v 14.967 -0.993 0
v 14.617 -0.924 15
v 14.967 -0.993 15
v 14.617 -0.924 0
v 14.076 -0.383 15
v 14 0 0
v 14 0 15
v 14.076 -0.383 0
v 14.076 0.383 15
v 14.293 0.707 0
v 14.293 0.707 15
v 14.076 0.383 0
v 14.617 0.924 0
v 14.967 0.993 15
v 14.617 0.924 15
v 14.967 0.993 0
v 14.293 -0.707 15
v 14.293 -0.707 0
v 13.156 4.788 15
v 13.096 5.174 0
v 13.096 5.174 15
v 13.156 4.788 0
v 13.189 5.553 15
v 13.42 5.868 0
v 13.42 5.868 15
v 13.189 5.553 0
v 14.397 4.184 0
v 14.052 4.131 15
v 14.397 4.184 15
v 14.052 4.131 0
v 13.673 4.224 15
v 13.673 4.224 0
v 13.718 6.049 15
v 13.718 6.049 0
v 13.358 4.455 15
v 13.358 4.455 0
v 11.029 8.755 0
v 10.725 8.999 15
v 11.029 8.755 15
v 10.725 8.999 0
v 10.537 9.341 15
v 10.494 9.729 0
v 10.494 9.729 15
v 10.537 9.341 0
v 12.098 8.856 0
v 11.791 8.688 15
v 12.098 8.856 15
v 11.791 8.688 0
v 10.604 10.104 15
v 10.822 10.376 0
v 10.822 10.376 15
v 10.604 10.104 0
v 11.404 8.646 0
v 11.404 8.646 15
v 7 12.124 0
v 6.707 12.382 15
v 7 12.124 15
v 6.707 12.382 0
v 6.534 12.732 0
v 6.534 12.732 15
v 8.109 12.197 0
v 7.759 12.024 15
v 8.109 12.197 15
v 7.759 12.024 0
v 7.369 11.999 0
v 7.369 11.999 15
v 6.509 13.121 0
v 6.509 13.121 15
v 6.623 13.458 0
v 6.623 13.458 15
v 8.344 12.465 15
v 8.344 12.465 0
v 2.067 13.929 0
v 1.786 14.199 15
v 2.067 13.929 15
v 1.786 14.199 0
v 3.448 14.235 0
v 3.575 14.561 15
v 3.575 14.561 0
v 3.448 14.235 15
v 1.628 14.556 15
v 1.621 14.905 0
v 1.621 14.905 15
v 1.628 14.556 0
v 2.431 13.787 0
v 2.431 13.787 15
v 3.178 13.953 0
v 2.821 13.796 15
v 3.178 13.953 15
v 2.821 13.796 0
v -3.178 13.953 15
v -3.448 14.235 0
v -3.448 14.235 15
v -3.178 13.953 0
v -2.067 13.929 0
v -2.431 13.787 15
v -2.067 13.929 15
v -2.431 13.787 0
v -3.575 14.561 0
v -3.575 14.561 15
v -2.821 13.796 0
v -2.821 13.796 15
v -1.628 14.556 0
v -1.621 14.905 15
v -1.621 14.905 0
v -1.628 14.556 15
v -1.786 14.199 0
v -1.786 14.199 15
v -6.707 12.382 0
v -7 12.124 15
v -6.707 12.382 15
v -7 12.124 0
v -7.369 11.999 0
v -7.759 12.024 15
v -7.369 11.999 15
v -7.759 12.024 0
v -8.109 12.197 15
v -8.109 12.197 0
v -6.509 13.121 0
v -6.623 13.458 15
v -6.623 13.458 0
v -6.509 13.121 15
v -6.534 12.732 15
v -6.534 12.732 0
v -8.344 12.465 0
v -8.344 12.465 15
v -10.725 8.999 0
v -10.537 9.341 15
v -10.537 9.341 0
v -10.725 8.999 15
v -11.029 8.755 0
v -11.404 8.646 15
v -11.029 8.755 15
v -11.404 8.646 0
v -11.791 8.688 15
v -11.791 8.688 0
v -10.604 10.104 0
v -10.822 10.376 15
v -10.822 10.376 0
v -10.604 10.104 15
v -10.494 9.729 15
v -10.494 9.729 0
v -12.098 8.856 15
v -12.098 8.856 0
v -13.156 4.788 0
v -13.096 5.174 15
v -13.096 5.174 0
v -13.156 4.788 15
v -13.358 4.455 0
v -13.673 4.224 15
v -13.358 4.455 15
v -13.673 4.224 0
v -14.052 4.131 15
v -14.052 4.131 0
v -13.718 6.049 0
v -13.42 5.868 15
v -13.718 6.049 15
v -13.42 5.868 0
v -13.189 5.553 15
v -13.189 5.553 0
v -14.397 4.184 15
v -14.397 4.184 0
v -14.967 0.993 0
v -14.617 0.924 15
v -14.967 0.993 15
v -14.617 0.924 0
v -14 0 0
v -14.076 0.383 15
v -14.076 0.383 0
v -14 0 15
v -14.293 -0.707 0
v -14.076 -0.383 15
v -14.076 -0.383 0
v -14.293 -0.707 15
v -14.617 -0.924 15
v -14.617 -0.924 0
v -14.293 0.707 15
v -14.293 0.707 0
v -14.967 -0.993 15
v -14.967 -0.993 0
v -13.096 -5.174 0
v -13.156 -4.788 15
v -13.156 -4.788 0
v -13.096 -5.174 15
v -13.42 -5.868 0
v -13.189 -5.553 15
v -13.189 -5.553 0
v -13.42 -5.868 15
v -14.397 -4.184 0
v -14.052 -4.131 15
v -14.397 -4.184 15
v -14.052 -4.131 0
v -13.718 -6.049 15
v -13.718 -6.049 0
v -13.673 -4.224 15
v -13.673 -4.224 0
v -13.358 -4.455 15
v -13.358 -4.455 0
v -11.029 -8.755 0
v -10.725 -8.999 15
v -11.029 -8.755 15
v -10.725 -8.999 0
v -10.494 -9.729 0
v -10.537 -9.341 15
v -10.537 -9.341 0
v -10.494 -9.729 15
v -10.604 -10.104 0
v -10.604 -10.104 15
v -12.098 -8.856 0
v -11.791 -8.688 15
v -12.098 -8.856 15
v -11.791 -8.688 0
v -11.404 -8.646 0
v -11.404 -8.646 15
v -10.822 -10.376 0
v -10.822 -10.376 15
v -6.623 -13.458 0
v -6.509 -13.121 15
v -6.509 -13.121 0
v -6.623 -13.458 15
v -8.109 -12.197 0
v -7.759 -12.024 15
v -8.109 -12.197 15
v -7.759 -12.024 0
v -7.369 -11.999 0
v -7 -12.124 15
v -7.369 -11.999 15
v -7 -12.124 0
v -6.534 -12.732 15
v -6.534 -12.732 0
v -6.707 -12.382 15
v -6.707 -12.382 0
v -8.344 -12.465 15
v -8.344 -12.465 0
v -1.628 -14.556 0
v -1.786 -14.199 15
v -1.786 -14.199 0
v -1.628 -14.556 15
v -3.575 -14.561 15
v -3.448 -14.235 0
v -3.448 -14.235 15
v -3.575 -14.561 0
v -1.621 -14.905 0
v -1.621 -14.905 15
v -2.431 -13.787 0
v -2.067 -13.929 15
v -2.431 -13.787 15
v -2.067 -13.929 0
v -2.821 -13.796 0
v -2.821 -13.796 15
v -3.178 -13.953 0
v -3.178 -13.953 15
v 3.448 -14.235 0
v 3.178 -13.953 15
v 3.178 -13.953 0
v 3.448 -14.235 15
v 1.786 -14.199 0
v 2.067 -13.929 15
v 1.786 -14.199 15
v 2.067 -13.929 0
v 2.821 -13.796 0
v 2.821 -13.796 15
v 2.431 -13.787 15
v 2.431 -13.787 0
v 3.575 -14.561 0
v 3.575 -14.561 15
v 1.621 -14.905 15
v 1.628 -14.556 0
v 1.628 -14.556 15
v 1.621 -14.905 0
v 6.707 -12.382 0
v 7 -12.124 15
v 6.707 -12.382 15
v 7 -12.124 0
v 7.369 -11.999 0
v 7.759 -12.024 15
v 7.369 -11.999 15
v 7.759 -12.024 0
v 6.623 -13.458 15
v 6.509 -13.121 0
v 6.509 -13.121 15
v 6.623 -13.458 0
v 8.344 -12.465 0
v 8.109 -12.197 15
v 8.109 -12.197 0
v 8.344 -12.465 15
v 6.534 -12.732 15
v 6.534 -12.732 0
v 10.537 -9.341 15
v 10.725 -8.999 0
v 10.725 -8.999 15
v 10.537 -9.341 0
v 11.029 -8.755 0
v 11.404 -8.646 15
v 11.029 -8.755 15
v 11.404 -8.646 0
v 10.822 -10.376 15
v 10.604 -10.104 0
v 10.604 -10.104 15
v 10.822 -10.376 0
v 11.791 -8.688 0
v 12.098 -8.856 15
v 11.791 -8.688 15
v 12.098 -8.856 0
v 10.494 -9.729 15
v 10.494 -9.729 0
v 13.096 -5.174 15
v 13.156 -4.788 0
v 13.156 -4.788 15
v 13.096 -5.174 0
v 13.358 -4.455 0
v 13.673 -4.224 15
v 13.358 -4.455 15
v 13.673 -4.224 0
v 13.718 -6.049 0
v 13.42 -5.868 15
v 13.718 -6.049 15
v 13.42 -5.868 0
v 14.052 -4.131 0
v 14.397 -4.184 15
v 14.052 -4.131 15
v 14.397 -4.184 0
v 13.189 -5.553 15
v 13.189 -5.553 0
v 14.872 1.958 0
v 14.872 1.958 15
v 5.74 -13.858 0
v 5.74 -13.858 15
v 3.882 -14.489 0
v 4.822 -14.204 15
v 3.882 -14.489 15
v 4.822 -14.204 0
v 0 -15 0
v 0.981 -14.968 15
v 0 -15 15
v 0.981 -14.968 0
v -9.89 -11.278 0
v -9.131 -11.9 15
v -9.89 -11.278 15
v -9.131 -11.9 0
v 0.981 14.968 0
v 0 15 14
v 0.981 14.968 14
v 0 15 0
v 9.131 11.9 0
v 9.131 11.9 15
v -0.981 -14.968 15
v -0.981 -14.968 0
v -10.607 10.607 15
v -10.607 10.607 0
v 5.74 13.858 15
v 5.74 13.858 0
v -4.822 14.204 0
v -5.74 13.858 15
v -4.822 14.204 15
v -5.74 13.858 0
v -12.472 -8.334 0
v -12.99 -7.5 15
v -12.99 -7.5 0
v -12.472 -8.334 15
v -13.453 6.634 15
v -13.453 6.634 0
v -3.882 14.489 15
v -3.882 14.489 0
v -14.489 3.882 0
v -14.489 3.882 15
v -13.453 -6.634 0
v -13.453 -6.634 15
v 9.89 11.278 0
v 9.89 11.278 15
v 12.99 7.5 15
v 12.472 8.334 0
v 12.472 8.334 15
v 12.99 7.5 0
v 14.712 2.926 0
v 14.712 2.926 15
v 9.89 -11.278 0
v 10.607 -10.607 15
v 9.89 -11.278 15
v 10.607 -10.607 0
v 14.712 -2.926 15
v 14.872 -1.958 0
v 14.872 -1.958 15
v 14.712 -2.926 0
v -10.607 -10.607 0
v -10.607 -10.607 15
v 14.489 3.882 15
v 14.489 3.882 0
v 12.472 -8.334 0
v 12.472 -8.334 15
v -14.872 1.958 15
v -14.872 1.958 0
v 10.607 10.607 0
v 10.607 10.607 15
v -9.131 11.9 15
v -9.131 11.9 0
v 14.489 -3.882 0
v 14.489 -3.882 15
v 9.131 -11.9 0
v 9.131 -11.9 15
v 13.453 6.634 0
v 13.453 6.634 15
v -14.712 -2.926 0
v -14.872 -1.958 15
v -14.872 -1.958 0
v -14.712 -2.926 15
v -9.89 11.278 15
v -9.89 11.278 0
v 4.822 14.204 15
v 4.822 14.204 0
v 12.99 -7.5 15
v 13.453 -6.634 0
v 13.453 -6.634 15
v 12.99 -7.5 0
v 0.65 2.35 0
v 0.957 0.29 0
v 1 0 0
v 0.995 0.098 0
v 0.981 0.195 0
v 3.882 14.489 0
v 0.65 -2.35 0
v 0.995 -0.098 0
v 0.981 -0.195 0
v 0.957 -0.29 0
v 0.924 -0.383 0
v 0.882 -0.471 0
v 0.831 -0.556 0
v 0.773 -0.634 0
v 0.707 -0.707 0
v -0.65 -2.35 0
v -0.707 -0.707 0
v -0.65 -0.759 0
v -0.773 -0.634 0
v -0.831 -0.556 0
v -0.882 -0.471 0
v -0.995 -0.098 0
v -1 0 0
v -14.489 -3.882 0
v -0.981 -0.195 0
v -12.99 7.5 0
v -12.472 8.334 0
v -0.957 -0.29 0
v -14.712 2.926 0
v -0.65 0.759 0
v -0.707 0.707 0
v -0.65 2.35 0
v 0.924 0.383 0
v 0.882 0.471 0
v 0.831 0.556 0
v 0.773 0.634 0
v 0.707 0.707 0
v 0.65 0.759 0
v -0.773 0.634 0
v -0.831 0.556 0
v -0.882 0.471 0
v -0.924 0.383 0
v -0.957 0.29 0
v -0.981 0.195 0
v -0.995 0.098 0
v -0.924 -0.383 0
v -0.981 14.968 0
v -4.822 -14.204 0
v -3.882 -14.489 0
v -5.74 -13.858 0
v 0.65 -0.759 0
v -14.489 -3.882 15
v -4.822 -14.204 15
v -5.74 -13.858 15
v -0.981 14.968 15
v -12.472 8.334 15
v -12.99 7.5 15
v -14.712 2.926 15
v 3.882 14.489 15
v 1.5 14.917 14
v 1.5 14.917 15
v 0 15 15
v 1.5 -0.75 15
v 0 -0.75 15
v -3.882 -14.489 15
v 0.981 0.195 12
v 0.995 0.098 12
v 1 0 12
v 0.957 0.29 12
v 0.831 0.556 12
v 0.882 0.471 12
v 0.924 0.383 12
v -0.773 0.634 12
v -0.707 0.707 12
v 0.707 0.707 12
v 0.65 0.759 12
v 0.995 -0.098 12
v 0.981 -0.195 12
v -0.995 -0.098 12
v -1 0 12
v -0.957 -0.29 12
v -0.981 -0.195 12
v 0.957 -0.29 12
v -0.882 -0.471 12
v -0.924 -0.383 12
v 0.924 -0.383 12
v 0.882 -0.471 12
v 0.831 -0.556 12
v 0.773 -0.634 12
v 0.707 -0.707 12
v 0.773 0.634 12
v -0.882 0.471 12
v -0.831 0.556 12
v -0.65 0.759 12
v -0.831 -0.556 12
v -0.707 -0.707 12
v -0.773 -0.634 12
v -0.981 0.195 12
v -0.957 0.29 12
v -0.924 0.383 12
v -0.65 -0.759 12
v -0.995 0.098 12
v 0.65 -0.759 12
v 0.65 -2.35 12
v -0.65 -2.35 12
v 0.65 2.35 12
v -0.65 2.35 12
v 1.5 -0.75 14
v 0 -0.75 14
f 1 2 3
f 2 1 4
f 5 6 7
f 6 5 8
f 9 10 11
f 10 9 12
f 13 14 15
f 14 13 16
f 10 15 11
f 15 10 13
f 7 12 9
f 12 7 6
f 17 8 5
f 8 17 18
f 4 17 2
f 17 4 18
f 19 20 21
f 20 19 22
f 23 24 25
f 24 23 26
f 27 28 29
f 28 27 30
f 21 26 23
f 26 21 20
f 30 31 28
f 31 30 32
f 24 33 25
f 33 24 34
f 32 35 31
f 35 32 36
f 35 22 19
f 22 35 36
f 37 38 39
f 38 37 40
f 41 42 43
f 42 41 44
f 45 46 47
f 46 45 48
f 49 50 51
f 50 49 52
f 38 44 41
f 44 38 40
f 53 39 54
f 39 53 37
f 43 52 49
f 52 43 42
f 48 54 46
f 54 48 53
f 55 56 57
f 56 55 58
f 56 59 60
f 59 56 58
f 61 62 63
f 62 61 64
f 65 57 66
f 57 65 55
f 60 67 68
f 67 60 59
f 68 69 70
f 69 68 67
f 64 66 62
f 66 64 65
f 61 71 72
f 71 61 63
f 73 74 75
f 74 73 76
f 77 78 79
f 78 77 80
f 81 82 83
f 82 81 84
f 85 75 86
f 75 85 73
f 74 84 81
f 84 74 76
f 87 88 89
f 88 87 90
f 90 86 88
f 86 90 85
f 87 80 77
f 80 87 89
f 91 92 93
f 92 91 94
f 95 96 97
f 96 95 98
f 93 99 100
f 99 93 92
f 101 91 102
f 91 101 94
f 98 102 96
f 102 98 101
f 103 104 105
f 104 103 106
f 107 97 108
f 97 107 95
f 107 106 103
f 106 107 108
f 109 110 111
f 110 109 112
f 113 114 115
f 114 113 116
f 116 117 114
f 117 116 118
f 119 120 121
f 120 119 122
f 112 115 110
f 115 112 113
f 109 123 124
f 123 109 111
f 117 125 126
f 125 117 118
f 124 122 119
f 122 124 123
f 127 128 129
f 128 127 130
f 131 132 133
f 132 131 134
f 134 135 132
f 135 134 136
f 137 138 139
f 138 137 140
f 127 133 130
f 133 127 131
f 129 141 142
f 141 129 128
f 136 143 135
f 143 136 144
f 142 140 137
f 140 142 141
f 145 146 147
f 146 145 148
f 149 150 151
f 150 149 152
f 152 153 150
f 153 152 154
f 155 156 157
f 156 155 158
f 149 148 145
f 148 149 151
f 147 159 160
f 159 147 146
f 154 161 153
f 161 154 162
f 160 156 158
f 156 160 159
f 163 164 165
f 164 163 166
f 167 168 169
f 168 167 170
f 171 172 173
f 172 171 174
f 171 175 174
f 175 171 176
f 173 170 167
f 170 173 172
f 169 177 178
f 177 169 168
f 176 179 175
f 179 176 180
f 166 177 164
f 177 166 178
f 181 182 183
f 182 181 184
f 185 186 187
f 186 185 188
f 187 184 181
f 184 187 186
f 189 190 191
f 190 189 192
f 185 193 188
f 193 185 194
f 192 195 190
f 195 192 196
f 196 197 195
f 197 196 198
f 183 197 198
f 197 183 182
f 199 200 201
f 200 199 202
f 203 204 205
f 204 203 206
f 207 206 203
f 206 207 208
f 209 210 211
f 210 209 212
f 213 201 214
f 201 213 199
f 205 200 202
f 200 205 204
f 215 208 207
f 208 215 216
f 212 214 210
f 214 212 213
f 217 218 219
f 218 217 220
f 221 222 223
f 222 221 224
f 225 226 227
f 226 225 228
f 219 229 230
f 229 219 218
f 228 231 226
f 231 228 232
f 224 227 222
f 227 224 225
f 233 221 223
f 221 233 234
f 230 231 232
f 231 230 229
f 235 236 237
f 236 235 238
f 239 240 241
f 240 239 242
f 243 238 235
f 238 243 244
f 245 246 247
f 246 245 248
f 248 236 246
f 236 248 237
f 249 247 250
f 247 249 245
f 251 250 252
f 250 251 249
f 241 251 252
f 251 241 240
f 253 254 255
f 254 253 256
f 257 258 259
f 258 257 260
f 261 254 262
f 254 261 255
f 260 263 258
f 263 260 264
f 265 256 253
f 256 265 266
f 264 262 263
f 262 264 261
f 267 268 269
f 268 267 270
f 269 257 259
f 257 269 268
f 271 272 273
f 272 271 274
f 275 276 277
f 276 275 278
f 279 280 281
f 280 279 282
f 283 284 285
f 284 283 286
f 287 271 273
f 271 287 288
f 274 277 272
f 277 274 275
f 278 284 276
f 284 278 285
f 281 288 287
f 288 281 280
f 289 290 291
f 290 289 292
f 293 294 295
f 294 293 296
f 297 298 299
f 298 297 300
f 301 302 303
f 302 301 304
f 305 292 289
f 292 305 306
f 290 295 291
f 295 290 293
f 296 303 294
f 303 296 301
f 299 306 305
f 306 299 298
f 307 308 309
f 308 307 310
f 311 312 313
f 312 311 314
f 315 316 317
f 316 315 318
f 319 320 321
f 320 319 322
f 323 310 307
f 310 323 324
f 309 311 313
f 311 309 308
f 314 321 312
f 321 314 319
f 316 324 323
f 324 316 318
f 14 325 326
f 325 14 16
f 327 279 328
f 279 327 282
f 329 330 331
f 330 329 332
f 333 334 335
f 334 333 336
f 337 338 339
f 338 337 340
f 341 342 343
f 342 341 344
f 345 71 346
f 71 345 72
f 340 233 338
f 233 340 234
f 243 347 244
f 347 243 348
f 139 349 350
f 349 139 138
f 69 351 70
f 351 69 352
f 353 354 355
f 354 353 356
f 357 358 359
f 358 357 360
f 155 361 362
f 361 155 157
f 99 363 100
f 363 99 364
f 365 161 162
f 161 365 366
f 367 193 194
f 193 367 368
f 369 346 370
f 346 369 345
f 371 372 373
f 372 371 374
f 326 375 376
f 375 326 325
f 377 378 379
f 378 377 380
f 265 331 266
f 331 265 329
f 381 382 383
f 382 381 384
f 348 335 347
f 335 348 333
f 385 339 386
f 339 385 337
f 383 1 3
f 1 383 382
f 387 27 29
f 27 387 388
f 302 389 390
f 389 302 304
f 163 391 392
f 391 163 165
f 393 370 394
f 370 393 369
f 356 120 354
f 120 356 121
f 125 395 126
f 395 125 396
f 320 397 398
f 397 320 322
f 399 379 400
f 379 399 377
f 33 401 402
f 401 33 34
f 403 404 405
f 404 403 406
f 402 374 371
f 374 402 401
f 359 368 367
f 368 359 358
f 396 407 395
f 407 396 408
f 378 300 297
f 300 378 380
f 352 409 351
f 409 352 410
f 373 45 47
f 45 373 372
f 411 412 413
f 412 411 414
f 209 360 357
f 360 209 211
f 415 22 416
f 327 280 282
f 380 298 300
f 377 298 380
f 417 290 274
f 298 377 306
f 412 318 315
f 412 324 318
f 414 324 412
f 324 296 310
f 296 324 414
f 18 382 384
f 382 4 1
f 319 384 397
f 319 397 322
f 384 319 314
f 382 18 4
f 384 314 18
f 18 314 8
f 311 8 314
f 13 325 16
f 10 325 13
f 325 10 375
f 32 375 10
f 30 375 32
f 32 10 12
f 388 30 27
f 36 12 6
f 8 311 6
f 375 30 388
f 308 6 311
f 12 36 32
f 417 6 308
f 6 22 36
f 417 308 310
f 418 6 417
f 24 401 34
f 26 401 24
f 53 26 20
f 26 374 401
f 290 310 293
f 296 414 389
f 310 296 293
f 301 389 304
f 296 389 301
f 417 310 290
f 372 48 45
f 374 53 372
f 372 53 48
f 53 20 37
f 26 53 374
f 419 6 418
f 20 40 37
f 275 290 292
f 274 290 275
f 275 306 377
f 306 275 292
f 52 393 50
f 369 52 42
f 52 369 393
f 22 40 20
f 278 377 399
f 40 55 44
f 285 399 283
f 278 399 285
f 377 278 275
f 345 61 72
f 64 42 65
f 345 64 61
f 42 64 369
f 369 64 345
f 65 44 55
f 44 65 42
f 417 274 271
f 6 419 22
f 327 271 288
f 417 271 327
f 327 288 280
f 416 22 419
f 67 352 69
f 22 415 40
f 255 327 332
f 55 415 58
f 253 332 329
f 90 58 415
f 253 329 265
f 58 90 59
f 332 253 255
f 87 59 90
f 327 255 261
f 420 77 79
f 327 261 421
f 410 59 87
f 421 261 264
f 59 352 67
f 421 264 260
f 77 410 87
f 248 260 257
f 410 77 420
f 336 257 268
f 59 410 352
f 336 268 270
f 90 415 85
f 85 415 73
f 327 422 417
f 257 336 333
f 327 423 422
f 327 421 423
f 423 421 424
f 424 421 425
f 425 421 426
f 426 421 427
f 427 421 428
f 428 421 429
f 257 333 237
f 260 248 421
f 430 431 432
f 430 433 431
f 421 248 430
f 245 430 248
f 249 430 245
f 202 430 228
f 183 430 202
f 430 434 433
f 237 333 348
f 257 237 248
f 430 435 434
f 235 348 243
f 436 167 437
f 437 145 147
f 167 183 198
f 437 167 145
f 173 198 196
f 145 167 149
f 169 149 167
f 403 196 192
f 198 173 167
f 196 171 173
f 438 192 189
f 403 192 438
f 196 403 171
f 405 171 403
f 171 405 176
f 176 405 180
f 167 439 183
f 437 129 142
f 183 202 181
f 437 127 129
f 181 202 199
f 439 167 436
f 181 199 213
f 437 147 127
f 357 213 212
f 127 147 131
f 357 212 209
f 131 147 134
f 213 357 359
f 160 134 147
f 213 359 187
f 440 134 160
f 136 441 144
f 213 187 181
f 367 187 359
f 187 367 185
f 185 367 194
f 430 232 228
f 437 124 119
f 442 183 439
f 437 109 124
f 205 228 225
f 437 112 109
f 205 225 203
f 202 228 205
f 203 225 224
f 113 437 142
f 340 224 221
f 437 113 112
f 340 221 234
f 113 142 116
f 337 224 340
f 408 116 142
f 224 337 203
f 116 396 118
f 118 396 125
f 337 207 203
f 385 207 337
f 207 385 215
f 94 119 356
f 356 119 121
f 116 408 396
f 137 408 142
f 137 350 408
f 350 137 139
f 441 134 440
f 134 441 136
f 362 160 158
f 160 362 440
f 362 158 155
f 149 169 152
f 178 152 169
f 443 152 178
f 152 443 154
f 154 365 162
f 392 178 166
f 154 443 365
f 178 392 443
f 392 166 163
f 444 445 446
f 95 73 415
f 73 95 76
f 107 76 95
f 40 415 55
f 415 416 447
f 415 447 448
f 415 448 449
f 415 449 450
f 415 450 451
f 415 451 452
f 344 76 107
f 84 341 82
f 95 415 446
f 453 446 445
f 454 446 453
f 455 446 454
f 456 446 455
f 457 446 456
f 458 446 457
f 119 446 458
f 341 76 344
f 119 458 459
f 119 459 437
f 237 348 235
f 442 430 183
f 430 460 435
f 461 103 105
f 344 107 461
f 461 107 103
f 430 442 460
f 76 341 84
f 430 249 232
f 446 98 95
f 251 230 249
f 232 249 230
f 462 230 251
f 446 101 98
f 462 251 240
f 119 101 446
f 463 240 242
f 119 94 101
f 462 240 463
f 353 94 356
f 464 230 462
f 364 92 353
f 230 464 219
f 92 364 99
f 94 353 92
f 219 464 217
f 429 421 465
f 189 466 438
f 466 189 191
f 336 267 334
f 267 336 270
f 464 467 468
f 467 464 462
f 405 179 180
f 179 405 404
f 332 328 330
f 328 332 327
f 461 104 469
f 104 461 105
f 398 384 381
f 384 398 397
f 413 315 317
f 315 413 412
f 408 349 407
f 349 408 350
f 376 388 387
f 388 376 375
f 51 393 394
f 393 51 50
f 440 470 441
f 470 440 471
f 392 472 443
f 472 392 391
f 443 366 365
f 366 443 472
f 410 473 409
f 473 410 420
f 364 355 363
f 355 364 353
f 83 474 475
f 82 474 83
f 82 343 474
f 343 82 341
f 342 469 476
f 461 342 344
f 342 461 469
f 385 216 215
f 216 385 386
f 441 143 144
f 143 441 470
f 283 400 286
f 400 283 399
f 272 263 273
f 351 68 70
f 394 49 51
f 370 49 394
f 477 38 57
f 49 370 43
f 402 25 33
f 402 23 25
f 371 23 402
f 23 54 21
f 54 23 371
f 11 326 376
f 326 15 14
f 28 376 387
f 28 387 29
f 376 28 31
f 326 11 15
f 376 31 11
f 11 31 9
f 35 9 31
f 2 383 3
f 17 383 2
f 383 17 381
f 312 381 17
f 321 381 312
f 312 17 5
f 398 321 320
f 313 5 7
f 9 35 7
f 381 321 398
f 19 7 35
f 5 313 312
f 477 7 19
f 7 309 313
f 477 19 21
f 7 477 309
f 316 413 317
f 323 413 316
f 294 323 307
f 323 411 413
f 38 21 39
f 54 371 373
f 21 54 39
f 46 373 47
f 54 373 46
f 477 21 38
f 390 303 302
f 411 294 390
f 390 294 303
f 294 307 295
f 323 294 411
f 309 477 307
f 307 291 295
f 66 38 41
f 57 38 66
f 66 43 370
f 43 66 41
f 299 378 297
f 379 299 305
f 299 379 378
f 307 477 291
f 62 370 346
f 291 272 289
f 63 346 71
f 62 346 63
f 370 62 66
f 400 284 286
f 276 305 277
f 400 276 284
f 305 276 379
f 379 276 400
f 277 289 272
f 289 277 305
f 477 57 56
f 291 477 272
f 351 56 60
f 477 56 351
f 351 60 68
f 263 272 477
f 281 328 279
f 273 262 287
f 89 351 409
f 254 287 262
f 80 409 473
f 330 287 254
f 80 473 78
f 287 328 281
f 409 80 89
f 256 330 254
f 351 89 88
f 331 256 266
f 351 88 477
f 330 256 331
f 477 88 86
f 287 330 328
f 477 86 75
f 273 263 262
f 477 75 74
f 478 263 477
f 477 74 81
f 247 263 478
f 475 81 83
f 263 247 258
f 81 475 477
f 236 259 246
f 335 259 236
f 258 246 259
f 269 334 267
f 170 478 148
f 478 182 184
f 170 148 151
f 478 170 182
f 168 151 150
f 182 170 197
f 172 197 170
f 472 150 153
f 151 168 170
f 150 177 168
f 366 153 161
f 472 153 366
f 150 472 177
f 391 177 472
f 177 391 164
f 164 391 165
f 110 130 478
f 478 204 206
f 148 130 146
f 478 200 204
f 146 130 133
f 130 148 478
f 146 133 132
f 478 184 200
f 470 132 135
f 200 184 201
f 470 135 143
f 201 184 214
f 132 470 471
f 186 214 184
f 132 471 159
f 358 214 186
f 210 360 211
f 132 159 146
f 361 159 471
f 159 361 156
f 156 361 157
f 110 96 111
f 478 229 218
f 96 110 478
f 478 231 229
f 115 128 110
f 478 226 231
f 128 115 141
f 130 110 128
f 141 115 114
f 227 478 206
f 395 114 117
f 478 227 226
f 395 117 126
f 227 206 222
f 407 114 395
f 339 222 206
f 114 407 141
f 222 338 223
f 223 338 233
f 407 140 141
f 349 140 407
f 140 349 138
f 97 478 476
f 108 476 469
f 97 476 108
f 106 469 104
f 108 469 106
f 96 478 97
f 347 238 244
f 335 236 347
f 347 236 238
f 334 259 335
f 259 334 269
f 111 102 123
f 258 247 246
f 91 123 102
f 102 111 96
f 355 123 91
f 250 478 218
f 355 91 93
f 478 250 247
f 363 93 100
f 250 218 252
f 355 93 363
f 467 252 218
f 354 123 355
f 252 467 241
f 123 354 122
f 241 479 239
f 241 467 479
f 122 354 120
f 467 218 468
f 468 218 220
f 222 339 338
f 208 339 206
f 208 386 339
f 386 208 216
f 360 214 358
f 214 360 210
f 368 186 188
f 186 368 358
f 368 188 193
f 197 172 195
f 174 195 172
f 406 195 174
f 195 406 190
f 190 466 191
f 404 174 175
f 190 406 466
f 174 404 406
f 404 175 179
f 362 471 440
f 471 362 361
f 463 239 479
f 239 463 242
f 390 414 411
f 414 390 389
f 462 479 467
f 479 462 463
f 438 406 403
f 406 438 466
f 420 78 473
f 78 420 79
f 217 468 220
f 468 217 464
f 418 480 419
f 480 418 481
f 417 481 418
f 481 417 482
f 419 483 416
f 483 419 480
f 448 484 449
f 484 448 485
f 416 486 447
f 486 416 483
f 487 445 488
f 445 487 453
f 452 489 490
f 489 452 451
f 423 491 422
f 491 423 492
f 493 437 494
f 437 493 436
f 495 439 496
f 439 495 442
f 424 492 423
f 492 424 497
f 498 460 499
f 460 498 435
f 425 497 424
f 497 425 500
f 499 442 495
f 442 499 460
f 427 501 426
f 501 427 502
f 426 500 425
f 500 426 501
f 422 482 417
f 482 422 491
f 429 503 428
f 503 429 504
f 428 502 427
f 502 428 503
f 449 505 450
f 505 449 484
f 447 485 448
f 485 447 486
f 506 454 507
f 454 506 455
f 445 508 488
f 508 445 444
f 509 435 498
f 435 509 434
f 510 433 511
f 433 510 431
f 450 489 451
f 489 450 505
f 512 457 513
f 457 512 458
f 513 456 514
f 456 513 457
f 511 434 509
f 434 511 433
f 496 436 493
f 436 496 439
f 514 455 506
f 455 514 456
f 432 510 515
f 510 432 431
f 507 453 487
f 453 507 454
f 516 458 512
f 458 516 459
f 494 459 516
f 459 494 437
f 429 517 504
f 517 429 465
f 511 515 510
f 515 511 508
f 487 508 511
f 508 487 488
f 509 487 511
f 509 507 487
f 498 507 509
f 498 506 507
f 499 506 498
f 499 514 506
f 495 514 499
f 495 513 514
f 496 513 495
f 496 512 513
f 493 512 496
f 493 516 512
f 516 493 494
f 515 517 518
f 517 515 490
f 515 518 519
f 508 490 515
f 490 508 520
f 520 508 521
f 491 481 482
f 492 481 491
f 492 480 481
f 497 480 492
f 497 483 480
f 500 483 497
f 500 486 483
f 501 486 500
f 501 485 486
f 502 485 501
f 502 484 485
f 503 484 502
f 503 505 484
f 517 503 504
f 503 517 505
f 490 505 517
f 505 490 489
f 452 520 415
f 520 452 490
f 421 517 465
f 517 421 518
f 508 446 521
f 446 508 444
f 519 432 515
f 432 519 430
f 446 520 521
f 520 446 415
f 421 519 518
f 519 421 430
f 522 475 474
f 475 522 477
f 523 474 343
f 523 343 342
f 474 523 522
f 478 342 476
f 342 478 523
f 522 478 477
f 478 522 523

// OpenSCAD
// Replacement knob for hotplate stirrer with D-shaft
// Print orientation: bottom face (shaft bore) on the bed (z = 0)

// ---------------- Parameters ----------------
knob_d        = 30;    // knob outer diameter
knob_h        = 15;    // knob height
shaft_d       = 6;     // D-shaft diameter
bore_depth    = 12;    // blind bore depth from bottom face
bore_flat     = 4.7;   // distance from D-bore flat to opposite side
groove_count  = 18;    // number of grip grooves
groove_d      = 2;     // grip groove diameter
pointer_w     = 1.5;   // pointer groove width
pointer_d     = 1;     // pointer groove depth
eps           = 0.5;   // overshoot for clean boolean cuts
$fn           = 96;    // curve resolution

// ---------------- Model ----------------
difference() {
    // Main body
    cylinder(d = knob_d, h = knob_h);

    // D-shaped blind bore from bottom face
    translate([0, 0, -eps])
        cylinder(h = bore_depth + eps, $fn = 64);
    // flatten one side of the D so the distance from the flat to the
    // opposite side is exactly bore_flat
    translate([-(shaft_d / 2 - bore_flat / 2), -bore_flat / 2, -eps])
        cube([shaft_d - bore_flat, bore_flat, bore_depth + eps]);

    // Vertical grip grooves around the full height
    for (i = [0 : groove_count - 1])
        rotate([0, 0, i * 360 / groove_count])
            translate([knob_d / 2, 0, -eps])
                cylinder(d = groove_d, h = knob_h + 2 * eps, $fn = 16);

    // Pointer groove from centre to outer edge on the flat side
    translate([0, -pointer_w / 2, knob_h - pointer_d])
        cube([pointer_w, knob_d / 2 + 1, pointer_d]);
}
